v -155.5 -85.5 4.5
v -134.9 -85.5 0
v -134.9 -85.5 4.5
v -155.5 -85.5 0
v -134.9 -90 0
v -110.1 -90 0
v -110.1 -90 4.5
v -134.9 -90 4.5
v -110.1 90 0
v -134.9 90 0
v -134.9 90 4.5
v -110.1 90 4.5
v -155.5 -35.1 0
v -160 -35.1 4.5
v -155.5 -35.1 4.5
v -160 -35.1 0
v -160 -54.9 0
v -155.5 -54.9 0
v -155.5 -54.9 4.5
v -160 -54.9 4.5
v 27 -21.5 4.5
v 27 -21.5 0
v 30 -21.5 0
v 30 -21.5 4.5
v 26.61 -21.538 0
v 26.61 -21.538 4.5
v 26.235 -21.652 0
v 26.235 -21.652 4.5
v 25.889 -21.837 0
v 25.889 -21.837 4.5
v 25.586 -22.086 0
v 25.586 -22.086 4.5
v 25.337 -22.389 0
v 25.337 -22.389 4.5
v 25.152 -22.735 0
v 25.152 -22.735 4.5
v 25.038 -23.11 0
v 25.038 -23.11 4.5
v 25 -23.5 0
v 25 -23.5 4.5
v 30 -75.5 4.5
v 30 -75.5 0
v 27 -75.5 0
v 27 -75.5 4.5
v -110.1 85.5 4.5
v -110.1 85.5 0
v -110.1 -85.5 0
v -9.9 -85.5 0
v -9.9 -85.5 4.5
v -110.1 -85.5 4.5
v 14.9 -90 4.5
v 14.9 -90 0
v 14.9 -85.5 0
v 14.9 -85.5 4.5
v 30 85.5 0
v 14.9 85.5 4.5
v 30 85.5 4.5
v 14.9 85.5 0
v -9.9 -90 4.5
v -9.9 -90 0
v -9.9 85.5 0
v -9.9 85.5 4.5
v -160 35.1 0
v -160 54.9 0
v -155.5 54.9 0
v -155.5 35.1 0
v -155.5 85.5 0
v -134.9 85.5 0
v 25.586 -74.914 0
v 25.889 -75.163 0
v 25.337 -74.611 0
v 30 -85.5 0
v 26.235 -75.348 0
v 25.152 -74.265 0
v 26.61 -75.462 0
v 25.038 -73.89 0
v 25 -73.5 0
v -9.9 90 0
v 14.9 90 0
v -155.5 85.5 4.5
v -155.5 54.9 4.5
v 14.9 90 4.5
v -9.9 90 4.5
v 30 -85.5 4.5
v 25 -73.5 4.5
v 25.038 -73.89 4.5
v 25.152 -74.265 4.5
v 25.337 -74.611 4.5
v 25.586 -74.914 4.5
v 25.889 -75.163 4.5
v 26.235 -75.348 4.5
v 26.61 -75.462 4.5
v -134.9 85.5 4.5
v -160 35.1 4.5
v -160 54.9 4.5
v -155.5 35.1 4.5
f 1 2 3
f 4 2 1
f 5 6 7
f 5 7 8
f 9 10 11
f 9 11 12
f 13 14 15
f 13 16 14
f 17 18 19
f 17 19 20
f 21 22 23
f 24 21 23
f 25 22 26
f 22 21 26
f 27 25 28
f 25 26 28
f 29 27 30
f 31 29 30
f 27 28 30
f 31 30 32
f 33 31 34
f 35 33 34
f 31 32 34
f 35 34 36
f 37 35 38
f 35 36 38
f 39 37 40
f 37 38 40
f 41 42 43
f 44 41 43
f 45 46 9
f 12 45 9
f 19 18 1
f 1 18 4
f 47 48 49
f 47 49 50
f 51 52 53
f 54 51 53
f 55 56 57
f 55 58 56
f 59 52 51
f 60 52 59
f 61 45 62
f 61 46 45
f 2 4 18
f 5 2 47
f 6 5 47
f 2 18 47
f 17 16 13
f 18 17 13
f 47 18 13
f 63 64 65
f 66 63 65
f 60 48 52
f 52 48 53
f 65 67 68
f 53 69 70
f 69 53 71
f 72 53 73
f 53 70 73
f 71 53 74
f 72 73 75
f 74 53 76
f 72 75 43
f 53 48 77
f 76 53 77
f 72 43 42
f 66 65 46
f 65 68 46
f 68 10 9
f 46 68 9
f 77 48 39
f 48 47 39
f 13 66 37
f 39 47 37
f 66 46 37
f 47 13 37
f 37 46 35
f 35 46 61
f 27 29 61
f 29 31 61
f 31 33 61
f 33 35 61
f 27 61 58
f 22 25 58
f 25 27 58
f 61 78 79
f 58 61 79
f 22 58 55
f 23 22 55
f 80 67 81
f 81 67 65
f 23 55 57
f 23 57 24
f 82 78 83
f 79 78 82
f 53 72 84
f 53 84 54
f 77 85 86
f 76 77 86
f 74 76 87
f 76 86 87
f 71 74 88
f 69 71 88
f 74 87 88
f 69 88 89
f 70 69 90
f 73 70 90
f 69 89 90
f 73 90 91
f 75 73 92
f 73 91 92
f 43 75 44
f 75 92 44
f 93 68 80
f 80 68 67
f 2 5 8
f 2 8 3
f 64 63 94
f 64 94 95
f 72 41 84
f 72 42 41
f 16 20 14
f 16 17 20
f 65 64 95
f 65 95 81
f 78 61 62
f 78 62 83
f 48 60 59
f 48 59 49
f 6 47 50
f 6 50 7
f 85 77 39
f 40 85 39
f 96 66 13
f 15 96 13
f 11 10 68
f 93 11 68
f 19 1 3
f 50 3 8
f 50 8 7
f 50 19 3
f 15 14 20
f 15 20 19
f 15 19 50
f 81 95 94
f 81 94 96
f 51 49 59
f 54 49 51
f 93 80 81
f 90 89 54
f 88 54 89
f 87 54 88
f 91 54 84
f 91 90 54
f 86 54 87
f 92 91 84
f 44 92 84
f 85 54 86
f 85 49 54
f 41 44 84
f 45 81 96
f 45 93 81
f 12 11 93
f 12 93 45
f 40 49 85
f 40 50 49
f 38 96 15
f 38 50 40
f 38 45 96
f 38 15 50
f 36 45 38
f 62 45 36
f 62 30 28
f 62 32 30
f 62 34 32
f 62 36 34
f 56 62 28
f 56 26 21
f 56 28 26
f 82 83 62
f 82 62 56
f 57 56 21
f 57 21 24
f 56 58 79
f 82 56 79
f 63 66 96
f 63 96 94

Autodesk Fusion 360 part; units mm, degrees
sketch "Sketch1" plane through (0, 0, 0) normal (0, 0, 1) x (1, 0, 0)
  line L0 (160, -90) -> (-160, -90)
  line L1 (-160, -90) -> (-160, 90)
  line L2 (-160, 90) -> (160, 90)
  line L3 (160, 90) -> (160, -90)
  line L4 (160, -90) -> (-160, 90) construction
  line L5 (-160, -90) -> (160, 90) construction
  line L6 (170, 85.5) -> (-180, 85.5) construction
  line L7 (-180, -85.5) -> (170, -85.5) construction
  line L8 (-155.5, 90) -> (-155.5, -90)
  line L9 (-160, 90) -> (-135, 90)
  line L10 (-135, 90) -> (-135, 85.5)
  line L11 (-135, 85.5) -> (-160, 85.5)
  line L12 (-160, 85.5) -> (-160, 90)
  line L13 (-160, -90) -> (-135, -90)
  line L14 (-135, -90) -> (-135, -85.5)
  line L15 (-135, -85.5) -> (-160, -85.5)
  line L16 (-160, -85.5) -> (-160, -90)
  line L17 (-110, -90) -> (-10, -90)
  line L18 (-10, -90) -> (-10, -85.5)
  line L19 (-10, -85.5) -> (-110, -85.5)
  line L20 (-110, -85.5) -> (-110, -90)
  line L21 (-10, -90) -> (15, -90)
  line L22 (15, -90) -> (15, -85.5)
  line L23 (15, -85.5) -> (-10, -85.5)
  line L24 (-10, -85.5) -> (-10, -90)
  line L25 (15, -90) -> (115, -90)
  line L26 (115, -85.5) -> (15, -85.5)
  line L27 (15, -85.5) -> (15, -90)
  line L28 (115, -90) -> (140, -90)
  line L29 (140, -85.5) -> (115, -85.5)
  line L30 (-135, 85.5) -> (-110, 85.5)
  line L31 (-110, 85.5) -> (-110, 90)
  line L32 (-110, 90) -> (-135, 90)
  line L33 (-135, 90) -> (-135, 85.5)
  line L34 (-110, 85.5) -> (-10, 85.5)
  line L35 (-10, 85.5) -> (-10, 90)
  line L36 (-10, 90) -> (-110, 90)
  line L37 (-110, 90) -> (-110, 85.5)
  line L38 (-10, 85.5) -> (15, 85.5)
  line L39 (15, 85.5) -> (15, 90)
  line L40 (15, 90) -> (-10, 90)
  line L41 (-10, 90) -> (-10, 85.5)
  line L42 (15, 85.5) -> (115, 85.5)
  line L43 (115, 90) -> (15, 90)
  line L44 (15, 90) -> (15, 85.5)
  line L45 (115, 85.5) -> (140, 85.5)
  line L46 (140, 90) -> (115, 90)
  line L47 (140, 85.5) -> (160, 85.5)
  line L48 (160, 85.5) -> (160, 90)
  line L49 (160, 90) -> (140, 90)
  line L50 (140, -90) -> (160, -90)
  line L51 (160, -90) -> (160, -85.5)
  line L52 (160, -85.5) -> (140, -85.5)
  line L53 (-160, 55) -> (-155.5, 55)
  line L54 (-155.5, 55) -> (-155.5, 35)
  line L55 (-155.5, 35) -> (-160, 35)
  line L56 (-160, 35) -> (-160, 55)
  line L57 (-160, -35) -> (-155.5, -35)
  line L58 (-155.5, -35) -> (-155.5, -55)
  line L59 (-155.5, -55) -> (-160, -55)
  line L60 (-160, -55) -> (-160, -35)
  line L61 (30, 90) -> (30, -90)
  line L62 (30, -75.5) -> (25, -75.5)
  line L63 (25, -75.5) -> (25, -21.5)
  line L64 (25, -21.5) -> (30, -21.5)
  line L65 (30, -21.5) -> (30, -75.5)
  point P0 (-15, -14)
  dimension "d1" = 320
  dimension "d2" = 180
  dimension "d3" = 4.5
  dimension "d4" = 4.5
  dimension "d5" = 4.5
  dimension "d6" = 25
  dimension "d7" = 25
  dimension "d8" = 100
  dimension "d9" = 25
  dimension "d10" = 25
  dimension "d13" = 25
  dimension "d14" = 100
  dimension "d15" = 25
  dimension "d18" = 20
  dimension "d19" = 20
  dimension "d20" = 35
  dimension "d21" = 35
  dimension "d46" = 15
  dimension "d55" = 5
  dimension "d56" = 54
  dimension "d58" = 10
extrude "Extrude1" add sketch "Sketch1" along normal blind 4.5 contours L0 L18 L21 L22 L23 L24 L27 | L0 L8 L11 L14 L15 L19 L20 L23 L26 L30 L34 L38 L42 L54 L58 L61 L62 L63 L64 | L2 L35 L38 L39 L40 L41 L44 | L2 L10 L30 L31 L32 L33 L37 | L1 L8 L57 L58 L59 L60 | L1 L8 L53 L54 L55 L56
move_face "OffsetFaces1" offset -0.1 4 faces at (15, -88.5, 1.5) (-110, -87, 1.5) (-110, 87, 1.5) (15, 87, 1.5)
move_face "OffsetFaces2" offset -0.1 4 faces at (-10, -88.5, 1.5) (-135, -88.5, 1.5) (-10, 87, 1.5) (-135, 88.5, 1.5)
move_face "OffsetFaces3" offset -0.1 2 faces at (-158.5, -35, 1.5) (-158.5, 55, 1.5)
move_face "OffsetFaces4" offset -0.1 2 faces at (-157, -55, 1.5) (-157, 35, 1.5)
fillet "Fillet1" radius 2 2 edges at (25, -75.5, 2.25) (25, -21.5, 2.25)
